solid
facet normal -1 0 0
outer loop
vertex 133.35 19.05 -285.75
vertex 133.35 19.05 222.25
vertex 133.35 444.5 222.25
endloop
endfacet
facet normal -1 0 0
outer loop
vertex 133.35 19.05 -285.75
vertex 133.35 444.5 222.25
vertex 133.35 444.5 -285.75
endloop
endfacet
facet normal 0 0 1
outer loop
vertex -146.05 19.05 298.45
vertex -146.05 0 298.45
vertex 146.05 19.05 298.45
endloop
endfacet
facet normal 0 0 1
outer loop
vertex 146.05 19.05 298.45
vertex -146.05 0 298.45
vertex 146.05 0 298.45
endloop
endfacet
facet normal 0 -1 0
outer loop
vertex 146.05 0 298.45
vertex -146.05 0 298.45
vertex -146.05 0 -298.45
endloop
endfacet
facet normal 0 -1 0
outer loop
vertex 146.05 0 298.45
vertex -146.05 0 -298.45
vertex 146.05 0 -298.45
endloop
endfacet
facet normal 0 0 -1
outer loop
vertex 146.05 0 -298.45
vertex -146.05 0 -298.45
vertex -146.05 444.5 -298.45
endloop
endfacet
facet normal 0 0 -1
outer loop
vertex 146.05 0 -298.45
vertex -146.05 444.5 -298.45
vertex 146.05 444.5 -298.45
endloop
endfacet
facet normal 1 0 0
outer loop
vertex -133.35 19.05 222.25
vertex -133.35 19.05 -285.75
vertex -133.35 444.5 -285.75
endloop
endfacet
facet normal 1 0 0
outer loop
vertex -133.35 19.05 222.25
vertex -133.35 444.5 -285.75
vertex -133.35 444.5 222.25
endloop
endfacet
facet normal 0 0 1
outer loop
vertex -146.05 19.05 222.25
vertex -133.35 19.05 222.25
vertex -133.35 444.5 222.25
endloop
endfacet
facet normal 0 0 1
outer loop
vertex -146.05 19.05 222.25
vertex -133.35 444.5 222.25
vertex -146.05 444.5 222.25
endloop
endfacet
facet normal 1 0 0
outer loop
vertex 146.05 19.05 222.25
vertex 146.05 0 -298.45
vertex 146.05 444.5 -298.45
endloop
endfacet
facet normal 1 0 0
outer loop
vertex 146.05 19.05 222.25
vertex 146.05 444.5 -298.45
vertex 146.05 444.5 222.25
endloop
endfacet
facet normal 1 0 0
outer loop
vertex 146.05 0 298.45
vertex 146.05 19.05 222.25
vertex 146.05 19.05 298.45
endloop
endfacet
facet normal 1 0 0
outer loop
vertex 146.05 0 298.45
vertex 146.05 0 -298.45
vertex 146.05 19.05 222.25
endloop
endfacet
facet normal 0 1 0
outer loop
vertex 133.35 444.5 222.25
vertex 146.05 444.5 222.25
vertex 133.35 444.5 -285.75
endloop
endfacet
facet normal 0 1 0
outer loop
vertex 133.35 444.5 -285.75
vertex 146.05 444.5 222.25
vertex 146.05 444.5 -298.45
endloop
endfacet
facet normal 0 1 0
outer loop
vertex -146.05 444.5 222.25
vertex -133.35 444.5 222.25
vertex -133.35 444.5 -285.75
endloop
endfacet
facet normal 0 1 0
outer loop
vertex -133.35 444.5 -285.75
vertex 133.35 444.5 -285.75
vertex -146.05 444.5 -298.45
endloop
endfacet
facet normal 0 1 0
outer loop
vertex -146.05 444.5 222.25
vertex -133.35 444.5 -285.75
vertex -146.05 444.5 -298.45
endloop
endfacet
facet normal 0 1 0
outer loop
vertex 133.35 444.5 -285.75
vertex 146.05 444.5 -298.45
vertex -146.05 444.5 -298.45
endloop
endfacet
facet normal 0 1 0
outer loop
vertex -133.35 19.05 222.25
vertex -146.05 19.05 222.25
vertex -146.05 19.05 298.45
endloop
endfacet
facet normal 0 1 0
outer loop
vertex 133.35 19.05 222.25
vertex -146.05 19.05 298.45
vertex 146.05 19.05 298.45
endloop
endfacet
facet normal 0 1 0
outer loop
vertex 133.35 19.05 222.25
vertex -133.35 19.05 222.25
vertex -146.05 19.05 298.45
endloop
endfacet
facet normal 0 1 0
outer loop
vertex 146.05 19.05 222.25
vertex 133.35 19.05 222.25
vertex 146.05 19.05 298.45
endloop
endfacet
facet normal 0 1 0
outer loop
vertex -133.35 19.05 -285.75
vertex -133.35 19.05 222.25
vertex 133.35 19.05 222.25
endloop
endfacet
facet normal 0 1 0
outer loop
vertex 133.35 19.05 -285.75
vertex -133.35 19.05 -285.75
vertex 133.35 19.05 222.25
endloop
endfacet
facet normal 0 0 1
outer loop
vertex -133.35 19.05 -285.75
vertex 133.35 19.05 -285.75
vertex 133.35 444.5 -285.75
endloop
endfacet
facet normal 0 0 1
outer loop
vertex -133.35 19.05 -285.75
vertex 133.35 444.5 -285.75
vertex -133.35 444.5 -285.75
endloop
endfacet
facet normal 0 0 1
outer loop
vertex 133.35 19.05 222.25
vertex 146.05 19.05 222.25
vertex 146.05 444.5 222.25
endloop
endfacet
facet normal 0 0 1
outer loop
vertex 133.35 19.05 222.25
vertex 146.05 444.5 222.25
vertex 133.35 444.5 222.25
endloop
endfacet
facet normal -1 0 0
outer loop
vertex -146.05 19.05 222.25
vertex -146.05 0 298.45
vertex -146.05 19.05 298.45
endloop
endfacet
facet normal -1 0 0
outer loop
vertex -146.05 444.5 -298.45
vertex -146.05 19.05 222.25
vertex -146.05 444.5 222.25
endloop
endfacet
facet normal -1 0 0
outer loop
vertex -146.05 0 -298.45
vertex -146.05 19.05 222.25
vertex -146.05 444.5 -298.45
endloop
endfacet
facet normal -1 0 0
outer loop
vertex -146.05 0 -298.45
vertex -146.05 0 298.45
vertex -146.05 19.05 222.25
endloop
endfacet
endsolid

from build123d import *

# Parameters (mm, degrees)
SKETCH1_W           = 292.1
SKETCH1_H           = 596.9
BOSS_EXTRUDE1_DEPTH = 19.05
BOSS_EXTRUDE2_DEPTH = 425.45


with BuildPart() as part:
    # Sketch1 → Boss-Extrude1 (new body)
    with BuildSketch(Plane(origin=(0, 0, 0), x_dir=(1, 0, 0), z_dir=(0, 1, 0))):
        Rectangle(SKETCH1_W, SKETCH1_H)
    extrude(amount=BOSS_EXTRUDE1_DEPTH)

    # Sketch2 → Boss-Extrude2 (add)
    with BuildSketch(Plane(origin=(0, 19.05, 0), x_dir=(1, 0, 0), z_dir=(0, 1, 0))):
        Polygon((-146.05, -222.25), (-146.05, 298.45), (146.05, 298.45), (146.05, -222.25), (133.35, -222.25), (133.35, 285.75), (-133.35, 285.75), (-133.35, -222.25), align=None)
    extrude(amount=BOSS_EXTRUDE2_DEPTH)


solid = part.part
